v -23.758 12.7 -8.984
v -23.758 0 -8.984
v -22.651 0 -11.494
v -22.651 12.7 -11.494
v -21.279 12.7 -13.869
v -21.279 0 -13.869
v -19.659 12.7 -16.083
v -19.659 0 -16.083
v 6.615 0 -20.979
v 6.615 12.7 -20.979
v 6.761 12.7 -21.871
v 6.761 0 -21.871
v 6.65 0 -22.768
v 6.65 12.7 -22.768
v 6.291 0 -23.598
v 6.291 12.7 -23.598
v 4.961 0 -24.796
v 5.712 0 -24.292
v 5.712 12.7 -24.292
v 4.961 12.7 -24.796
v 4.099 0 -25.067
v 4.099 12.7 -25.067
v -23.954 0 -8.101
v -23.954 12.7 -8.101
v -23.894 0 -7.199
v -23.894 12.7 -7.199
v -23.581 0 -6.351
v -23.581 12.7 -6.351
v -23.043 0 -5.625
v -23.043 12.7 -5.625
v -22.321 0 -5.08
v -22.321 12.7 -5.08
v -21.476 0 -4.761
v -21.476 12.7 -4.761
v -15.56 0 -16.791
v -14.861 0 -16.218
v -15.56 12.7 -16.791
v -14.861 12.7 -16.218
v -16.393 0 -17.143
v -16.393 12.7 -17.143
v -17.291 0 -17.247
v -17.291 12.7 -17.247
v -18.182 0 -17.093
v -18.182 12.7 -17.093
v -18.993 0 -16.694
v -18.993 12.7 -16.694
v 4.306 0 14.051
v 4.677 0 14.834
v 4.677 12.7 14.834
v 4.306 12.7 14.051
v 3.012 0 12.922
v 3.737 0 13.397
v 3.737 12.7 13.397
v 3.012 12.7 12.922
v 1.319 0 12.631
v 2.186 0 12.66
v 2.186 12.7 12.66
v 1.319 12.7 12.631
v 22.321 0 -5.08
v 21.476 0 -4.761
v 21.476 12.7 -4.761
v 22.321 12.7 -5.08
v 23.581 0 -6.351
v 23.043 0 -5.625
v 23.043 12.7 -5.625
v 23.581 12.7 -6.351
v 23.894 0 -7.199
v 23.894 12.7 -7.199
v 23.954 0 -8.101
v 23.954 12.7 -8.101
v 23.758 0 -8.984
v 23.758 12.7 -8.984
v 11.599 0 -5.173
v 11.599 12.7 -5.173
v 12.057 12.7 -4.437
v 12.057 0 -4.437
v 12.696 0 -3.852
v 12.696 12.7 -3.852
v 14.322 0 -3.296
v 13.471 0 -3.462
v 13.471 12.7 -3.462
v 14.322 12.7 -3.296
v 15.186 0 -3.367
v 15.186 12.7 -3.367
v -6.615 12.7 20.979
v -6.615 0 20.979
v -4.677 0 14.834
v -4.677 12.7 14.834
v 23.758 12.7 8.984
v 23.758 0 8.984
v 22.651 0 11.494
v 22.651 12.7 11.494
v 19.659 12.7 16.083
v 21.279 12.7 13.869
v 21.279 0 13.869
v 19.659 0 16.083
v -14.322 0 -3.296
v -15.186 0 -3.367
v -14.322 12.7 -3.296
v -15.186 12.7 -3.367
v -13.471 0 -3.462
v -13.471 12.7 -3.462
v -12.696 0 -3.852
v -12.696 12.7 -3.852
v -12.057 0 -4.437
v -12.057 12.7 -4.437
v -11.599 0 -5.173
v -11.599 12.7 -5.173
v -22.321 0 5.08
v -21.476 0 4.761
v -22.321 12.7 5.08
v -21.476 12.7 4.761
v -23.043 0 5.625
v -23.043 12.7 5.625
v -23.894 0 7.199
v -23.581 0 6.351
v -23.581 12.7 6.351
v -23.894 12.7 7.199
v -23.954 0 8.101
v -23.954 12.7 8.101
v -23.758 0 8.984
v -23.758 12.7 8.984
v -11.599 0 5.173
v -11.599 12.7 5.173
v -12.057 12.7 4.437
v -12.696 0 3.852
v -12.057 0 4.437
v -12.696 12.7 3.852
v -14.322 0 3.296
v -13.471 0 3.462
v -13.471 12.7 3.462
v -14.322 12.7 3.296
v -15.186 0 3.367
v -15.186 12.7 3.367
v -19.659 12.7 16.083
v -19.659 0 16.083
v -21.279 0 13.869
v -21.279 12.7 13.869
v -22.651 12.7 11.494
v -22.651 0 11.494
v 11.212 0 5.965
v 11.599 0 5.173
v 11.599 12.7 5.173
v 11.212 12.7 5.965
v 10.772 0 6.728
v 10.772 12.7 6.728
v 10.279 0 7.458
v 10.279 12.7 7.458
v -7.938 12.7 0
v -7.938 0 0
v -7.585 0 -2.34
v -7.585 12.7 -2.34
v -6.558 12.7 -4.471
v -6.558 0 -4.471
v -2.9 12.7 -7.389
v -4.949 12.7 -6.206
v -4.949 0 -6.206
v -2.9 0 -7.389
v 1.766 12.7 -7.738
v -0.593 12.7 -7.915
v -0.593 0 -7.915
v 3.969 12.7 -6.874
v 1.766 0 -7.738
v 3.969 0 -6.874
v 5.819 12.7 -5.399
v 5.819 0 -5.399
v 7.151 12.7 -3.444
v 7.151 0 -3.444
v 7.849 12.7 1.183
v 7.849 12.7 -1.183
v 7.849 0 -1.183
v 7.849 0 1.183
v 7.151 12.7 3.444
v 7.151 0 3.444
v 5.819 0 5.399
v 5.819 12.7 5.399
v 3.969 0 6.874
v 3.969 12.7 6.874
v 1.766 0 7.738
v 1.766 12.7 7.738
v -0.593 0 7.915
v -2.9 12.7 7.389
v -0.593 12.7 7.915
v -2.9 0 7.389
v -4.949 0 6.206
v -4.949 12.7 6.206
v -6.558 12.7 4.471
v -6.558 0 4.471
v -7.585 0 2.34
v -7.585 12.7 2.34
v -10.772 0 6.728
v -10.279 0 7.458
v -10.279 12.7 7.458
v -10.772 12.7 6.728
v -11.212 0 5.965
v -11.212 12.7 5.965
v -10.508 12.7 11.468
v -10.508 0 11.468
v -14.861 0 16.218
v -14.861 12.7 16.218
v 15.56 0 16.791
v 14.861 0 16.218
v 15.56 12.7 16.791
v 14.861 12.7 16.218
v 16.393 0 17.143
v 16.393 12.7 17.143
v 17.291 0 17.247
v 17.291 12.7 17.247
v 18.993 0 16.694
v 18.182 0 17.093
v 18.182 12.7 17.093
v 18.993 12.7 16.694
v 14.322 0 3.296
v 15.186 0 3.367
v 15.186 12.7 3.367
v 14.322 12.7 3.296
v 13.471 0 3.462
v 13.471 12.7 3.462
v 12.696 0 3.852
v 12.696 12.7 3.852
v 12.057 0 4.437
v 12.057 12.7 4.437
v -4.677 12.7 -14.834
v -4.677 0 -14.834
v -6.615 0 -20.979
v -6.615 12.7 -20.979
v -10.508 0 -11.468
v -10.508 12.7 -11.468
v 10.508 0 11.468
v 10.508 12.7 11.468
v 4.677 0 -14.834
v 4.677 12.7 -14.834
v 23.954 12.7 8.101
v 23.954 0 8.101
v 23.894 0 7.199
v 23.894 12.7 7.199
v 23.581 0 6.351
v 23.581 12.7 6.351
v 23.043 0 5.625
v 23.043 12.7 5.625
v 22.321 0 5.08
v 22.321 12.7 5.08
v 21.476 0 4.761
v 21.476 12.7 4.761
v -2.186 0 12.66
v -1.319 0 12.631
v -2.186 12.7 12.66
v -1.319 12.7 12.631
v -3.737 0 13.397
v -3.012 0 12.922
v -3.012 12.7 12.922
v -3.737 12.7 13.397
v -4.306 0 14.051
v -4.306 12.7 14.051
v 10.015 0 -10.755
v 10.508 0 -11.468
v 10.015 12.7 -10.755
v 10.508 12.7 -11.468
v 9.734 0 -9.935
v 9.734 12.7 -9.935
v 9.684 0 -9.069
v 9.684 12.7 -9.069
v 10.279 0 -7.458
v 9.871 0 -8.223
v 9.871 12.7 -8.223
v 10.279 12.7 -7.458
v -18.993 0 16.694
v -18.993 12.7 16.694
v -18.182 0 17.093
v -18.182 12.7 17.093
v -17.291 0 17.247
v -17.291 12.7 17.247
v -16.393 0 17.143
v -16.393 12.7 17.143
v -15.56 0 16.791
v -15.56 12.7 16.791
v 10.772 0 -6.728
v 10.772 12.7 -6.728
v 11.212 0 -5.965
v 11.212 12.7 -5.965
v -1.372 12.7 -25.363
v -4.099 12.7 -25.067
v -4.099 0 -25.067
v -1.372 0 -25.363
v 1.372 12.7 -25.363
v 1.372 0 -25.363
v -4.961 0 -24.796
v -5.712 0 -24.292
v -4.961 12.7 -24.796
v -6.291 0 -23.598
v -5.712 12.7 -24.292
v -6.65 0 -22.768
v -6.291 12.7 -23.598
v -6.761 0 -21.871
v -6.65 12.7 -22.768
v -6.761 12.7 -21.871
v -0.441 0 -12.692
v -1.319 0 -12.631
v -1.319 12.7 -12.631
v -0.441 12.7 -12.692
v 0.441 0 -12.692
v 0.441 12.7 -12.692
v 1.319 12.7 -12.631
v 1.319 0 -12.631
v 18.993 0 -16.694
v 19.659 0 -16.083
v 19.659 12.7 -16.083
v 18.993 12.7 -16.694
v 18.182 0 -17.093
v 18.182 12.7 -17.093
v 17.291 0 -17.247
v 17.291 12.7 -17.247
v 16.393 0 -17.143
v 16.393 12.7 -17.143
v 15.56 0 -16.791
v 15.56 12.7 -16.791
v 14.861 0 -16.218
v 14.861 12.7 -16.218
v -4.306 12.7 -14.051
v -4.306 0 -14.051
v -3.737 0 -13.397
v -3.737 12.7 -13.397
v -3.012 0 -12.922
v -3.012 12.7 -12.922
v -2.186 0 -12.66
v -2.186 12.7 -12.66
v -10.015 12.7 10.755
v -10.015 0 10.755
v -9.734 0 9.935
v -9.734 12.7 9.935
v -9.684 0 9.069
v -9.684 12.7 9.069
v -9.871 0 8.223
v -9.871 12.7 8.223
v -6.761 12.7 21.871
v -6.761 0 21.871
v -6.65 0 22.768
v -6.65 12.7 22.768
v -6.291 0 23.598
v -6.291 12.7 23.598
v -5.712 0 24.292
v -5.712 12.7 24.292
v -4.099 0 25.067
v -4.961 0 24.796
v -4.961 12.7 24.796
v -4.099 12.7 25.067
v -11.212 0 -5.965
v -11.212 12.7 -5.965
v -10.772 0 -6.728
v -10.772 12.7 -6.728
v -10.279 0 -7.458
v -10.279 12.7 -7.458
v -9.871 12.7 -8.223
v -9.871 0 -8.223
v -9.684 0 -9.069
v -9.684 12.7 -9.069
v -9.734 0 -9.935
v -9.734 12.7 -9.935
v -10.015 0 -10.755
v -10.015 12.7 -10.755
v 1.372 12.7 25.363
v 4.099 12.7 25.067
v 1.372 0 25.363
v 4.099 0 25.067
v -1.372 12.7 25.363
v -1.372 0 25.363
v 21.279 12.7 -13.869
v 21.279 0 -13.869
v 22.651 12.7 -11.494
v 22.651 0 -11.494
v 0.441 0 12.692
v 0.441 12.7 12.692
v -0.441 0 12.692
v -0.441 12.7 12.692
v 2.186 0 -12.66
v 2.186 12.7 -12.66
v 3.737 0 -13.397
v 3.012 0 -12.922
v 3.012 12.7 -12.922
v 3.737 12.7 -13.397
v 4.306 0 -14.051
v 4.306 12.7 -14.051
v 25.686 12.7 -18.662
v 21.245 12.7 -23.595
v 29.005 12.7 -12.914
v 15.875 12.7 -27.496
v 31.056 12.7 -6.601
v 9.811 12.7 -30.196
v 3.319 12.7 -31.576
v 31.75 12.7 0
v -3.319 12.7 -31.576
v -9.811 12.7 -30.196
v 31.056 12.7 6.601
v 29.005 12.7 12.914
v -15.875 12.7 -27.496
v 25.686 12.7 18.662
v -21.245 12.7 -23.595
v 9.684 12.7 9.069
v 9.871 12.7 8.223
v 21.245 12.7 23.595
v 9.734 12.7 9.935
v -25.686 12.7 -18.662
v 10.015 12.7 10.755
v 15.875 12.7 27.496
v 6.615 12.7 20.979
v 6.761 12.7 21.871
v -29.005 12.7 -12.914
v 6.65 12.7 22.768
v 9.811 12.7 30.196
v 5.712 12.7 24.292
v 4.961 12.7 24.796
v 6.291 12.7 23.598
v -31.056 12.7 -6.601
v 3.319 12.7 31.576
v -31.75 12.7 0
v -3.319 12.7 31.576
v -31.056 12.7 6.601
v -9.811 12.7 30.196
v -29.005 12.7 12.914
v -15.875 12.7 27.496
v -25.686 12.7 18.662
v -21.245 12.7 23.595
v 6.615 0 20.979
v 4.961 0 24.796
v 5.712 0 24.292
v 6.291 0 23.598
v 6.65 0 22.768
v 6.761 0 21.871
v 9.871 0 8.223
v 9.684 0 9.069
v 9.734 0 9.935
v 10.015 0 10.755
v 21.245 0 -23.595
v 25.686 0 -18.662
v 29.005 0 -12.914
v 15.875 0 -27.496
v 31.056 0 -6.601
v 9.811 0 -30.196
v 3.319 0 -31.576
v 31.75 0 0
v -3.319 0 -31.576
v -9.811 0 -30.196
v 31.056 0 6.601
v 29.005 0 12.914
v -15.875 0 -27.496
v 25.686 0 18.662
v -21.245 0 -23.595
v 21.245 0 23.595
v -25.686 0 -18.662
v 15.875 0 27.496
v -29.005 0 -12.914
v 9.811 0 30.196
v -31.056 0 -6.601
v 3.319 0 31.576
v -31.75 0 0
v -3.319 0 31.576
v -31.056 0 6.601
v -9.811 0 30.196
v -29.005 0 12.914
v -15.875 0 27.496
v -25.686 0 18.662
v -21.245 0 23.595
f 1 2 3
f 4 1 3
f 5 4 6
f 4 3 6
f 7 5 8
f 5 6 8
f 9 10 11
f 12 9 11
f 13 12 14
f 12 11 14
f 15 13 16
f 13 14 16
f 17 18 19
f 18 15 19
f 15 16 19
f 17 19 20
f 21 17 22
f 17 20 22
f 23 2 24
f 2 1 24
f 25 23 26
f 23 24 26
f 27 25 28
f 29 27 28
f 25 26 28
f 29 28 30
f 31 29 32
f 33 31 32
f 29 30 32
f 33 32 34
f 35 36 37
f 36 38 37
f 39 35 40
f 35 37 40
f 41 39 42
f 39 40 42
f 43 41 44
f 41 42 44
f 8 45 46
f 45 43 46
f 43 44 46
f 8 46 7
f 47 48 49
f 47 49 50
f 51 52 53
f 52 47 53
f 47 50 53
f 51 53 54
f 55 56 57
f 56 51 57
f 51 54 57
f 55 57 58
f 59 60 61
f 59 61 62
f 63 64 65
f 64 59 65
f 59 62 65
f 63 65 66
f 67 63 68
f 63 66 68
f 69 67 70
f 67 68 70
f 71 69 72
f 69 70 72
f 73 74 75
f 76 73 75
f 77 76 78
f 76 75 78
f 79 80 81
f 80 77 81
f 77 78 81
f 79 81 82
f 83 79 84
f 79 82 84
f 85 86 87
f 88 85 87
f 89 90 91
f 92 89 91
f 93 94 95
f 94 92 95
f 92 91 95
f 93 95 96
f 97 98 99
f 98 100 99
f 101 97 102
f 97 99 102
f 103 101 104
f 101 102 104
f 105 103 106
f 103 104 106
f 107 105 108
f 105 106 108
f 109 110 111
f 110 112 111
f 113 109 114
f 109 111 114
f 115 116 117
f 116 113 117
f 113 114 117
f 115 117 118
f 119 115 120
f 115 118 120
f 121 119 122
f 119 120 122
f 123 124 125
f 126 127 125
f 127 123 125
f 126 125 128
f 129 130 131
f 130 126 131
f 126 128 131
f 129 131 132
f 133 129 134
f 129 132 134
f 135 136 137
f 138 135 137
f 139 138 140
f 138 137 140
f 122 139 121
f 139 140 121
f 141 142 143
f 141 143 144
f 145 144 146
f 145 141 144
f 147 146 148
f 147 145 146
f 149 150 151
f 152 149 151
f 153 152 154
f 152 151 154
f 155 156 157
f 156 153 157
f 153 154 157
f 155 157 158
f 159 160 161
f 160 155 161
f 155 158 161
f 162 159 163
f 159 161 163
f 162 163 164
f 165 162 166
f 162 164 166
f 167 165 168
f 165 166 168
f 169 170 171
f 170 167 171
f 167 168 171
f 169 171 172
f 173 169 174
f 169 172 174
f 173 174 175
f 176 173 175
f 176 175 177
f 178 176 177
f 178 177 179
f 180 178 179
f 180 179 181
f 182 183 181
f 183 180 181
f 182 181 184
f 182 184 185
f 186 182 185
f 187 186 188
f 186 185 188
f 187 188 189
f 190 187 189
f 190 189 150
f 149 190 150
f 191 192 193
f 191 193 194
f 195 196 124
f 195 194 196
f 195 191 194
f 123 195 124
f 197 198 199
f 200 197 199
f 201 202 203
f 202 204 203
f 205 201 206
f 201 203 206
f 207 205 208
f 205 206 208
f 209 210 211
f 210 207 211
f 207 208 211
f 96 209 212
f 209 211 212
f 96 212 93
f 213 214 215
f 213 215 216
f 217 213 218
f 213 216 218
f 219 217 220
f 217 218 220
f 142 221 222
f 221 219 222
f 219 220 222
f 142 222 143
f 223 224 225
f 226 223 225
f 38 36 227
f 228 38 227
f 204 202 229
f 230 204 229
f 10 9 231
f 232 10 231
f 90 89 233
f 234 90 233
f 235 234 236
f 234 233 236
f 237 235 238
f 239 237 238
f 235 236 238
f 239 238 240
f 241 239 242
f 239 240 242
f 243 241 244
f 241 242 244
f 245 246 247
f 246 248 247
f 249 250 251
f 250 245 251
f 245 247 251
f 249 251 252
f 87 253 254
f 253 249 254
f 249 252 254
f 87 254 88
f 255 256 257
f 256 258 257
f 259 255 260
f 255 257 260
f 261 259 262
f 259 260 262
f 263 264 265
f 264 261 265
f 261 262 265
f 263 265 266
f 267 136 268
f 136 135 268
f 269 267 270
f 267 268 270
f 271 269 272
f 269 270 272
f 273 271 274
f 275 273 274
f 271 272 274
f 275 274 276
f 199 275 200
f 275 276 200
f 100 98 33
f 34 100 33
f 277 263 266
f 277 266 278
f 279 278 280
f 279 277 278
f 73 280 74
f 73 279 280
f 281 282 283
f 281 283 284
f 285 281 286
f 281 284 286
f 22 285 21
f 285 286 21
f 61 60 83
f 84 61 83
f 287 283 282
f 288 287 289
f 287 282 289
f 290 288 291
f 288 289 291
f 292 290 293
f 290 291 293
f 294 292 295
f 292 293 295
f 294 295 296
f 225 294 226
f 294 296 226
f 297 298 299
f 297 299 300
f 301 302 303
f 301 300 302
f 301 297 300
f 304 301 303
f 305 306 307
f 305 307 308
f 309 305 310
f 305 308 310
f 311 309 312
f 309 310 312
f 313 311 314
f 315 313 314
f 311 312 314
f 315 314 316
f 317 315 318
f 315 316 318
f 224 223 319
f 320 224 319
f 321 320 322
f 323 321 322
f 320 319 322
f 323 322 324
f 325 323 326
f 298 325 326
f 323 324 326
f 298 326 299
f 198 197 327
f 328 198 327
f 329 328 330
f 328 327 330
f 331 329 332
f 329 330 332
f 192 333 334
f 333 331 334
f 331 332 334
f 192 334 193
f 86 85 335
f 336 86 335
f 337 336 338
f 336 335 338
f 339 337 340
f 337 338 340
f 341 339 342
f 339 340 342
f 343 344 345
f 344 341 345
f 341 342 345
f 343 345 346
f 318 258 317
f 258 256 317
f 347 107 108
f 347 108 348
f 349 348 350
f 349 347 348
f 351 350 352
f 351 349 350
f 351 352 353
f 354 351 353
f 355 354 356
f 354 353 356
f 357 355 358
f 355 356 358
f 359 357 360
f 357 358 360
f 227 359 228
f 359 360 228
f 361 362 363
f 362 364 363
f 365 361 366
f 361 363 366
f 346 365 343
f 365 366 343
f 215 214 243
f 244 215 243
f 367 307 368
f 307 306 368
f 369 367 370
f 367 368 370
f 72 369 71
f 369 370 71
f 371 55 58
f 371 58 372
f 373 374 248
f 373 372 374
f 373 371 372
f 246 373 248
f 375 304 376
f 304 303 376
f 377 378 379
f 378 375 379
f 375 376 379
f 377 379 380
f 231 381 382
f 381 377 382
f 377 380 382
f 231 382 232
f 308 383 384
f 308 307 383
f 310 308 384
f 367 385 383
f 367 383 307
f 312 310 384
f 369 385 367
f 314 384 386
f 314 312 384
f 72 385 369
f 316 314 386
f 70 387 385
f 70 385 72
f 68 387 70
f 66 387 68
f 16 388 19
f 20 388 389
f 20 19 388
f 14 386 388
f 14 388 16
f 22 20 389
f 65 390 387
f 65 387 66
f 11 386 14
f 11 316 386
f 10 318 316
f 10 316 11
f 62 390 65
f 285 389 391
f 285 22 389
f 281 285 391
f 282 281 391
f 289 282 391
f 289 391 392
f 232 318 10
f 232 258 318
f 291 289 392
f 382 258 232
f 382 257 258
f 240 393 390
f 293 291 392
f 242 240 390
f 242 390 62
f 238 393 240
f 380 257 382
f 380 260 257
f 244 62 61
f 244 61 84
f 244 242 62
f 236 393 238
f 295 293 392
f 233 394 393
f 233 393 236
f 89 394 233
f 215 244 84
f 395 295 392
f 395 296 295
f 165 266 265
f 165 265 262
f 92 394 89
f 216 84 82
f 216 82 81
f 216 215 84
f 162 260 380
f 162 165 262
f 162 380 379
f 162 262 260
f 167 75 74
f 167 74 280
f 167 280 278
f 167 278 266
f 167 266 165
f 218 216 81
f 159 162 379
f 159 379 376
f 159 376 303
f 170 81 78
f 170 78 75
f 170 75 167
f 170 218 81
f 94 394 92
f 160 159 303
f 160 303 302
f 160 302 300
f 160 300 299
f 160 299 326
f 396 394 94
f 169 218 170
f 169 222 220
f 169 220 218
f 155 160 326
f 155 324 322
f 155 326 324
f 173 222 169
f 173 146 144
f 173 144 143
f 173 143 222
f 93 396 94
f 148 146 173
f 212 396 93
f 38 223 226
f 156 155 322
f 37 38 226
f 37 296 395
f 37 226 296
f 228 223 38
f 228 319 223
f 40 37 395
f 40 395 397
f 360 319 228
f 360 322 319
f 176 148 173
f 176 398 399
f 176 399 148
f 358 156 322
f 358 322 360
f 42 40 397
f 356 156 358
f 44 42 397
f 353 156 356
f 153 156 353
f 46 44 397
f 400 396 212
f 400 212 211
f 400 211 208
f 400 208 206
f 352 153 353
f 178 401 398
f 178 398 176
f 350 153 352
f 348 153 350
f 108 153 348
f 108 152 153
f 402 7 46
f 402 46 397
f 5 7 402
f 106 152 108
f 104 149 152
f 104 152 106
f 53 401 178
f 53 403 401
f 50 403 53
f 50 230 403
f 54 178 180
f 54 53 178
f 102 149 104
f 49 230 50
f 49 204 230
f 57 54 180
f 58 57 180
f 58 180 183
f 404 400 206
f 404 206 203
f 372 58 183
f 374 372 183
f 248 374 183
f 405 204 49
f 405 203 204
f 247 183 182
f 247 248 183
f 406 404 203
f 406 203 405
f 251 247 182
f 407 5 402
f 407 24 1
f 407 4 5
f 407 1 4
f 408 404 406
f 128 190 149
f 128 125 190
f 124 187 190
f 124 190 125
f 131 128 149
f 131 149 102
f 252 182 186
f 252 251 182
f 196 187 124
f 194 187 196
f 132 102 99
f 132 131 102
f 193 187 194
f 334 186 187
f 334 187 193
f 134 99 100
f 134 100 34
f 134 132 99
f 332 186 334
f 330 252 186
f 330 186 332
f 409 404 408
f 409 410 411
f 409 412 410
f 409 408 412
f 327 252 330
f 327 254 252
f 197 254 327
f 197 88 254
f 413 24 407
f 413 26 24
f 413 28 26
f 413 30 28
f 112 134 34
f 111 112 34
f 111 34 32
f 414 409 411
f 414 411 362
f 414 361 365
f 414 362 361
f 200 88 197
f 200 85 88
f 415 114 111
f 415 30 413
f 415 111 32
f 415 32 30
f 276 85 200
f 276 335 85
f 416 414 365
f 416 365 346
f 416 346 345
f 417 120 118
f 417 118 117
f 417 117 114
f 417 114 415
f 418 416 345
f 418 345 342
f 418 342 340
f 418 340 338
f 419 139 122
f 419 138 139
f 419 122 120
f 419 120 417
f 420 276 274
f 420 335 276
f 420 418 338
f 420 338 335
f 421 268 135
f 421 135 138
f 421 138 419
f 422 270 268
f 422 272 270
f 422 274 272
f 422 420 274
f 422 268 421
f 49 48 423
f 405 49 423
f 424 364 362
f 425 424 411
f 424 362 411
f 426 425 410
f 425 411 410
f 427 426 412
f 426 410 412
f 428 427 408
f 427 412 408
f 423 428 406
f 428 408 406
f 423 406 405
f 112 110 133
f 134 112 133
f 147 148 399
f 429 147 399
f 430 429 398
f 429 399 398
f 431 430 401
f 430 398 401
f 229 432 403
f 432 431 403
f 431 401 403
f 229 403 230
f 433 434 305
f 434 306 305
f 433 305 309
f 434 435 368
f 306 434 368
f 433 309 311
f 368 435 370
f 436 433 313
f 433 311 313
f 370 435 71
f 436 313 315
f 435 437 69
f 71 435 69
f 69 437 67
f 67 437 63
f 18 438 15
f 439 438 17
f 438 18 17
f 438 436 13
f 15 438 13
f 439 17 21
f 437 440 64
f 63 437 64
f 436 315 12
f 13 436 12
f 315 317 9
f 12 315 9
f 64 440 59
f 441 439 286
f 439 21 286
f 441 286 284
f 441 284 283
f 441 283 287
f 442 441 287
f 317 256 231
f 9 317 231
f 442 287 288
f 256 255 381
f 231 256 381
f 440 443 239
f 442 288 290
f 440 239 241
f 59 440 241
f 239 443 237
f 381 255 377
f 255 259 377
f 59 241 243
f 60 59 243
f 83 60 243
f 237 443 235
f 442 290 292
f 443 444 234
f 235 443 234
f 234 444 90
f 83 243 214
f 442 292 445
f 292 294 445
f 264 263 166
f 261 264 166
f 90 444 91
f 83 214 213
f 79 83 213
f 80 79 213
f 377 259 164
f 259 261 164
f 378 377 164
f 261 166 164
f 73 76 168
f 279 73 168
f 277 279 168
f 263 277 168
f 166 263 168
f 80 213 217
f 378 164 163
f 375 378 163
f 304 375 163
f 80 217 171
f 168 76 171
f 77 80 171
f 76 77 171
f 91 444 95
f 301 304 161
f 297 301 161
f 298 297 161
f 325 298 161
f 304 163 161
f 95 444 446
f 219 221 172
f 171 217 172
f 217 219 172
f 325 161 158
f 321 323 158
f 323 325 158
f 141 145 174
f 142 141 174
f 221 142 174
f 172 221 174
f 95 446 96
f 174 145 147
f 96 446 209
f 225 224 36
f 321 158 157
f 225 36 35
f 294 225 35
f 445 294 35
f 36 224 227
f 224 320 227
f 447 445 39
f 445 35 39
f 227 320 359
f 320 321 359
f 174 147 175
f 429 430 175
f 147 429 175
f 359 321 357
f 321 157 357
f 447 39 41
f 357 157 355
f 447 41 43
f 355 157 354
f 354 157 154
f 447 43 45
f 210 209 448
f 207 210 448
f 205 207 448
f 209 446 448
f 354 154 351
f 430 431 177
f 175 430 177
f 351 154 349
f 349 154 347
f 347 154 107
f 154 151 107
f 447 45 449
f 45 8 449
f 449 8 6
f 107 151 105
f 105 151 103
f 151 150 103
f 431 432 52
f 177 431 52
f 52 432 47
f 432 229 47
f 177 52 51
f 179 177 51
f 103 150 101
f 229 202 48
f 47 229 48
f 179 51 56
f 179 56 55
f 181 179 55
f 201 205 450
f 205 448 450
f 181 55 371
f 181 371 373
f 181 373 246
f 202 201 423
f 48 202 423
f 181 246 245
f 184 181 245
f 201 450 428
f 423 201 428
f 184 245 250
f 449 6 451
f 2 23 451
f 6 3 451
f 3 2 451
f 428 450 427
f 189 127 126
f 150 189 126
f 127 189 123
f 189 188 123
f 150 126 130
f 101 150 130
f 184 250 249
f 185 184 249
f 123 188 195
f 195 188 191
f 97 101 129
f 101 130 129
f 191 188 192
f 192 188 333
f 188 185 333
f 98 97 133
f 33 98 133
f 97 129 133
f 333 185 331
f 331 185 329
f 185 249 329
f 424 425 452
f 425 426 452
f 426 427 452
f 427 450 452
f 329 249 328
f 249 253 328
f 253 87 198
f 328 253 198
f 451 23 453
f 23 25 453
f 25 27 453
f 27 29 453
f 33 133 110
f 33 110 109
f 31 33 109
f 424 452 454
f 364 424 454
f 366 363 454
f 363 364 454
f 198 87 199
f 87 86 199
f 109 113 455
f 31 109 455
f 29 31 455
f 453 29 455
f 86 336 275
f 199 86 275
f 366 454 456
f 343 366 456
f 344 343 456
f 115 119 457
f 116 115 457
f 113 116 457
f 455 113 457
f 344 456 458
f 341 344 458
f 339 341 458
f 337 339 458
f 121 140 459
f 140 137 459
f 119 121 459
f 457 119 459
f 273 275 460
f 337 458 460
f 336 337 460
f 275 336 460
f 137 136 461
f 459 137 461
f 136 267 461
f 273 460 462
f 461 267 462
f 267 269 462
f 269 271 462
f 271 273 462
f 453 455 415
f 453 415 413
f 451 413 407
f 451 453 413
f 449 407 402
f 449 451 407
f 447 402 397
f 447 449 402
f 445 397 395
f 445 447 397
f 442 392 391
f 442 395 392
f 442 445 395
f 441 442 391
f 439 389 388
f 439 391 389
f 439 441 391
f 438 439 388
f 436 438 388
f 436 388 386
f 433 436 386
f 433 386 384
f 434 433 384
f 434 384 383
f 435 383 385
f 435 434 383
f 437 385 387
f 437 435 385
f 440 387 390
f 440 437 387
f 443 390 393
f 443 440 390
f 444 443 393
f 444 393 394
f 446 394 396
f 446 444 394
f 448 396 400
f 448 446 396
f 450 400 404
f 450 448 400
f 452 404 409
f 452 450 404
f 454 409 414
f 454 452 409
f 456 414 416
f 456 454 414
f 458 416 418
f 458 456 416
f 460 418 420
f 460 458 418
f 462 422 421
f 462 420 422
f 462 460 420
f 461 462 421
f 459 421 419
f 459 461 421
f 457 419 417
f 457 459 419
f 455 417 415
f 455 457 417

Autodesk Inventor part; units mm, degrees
ref_plane "YZ Plane" through (0, 0, 0) normal (1, 0, 0) x (0, 1, 0)
ref_plane "XZ Plane" through (0, 0, 0) normal (0, 1, 0) x (-1, 0, 0)
ref_plane "XY Plane" through (0, 0, 0) normal (0, 0, 1) x (1, 0, 0)
sketch "Sketch1" plane through (0, 0, 0) normal (0, 1, 0) x (-1, 0, 0)
  circle A0 centre (0, 0) radius 31.75
  circle A1 centre (0, 0) radius 12.7
  circle A2 centre (0, 0) radius 25.4
  line L0 (24.7979, 5.4976) -> (12.399, 2.7488)
  line L1 (12.399, -2.7488) -> (24.7979, -5.4976)
  circle A3 centre (0, 0) radius 7.9375
  line L2 (0, 0) -> (7.9375, 0) construction
  line L3 (8.58, 9.3634) -> (17.16, 18.7268)
  line L4 (7.6379, 24.2244) -> (3.819, 12.1122)
  line L5 (-3.819, 12.1122) -> (-7.6379, 24.2244)
  line L6 (-17.16, 18.7268) -> (-8.58, 9.3634)
  line L7 (-12.399, 2.7488) -> (-24.7979, 5.4976)
  line L8 (-24.7979, -5.4976) -> (-12.399, -2.7488)
  line L9 (-8.58, -9.3634) -> (-17.16, -18.7268)
  line L10 (-7.6379, -24.2244) -> (-3.819, -12.1122)
  line L11 (3.819, -12.1122) -> (7.6379, -24.2244)
  line L12 (17.16, -18.7268) -> (8.58, -9.3634)
  dimension "d3" = 15.875
  dimension "d0" = 63.5
  dimension "d1" = 25.4
  dimension "d2" = 50.8
  dimension "d4" = 25
  dimension "d7" = 360
extrude "Extrusion1" add sketch "Sketch1" along normal blind 12.7 contours A0 | A1 | A1 L0 A2 L1 | A1 L4 A2 L3 | L12 A2 L11 A1 | A1 L6 A2 L5 | L10 A2 L9 A1 | A1 L8 A2 L7
fillet "Fillet1" radius 3.175 4 edges at (-3.819, 6.35, -12.1122) (3.819, 6.35, -12.1122) (7.6379, 6.35, -24.2244) (-7.6379, 6.35, -24.2244)
pattern_circular "Circular Pattern1" count 6 over 360 about axis through (0, 0, 0) along (0, 1, 0) of "Fillet1"
properties part number "2.5in flex"
